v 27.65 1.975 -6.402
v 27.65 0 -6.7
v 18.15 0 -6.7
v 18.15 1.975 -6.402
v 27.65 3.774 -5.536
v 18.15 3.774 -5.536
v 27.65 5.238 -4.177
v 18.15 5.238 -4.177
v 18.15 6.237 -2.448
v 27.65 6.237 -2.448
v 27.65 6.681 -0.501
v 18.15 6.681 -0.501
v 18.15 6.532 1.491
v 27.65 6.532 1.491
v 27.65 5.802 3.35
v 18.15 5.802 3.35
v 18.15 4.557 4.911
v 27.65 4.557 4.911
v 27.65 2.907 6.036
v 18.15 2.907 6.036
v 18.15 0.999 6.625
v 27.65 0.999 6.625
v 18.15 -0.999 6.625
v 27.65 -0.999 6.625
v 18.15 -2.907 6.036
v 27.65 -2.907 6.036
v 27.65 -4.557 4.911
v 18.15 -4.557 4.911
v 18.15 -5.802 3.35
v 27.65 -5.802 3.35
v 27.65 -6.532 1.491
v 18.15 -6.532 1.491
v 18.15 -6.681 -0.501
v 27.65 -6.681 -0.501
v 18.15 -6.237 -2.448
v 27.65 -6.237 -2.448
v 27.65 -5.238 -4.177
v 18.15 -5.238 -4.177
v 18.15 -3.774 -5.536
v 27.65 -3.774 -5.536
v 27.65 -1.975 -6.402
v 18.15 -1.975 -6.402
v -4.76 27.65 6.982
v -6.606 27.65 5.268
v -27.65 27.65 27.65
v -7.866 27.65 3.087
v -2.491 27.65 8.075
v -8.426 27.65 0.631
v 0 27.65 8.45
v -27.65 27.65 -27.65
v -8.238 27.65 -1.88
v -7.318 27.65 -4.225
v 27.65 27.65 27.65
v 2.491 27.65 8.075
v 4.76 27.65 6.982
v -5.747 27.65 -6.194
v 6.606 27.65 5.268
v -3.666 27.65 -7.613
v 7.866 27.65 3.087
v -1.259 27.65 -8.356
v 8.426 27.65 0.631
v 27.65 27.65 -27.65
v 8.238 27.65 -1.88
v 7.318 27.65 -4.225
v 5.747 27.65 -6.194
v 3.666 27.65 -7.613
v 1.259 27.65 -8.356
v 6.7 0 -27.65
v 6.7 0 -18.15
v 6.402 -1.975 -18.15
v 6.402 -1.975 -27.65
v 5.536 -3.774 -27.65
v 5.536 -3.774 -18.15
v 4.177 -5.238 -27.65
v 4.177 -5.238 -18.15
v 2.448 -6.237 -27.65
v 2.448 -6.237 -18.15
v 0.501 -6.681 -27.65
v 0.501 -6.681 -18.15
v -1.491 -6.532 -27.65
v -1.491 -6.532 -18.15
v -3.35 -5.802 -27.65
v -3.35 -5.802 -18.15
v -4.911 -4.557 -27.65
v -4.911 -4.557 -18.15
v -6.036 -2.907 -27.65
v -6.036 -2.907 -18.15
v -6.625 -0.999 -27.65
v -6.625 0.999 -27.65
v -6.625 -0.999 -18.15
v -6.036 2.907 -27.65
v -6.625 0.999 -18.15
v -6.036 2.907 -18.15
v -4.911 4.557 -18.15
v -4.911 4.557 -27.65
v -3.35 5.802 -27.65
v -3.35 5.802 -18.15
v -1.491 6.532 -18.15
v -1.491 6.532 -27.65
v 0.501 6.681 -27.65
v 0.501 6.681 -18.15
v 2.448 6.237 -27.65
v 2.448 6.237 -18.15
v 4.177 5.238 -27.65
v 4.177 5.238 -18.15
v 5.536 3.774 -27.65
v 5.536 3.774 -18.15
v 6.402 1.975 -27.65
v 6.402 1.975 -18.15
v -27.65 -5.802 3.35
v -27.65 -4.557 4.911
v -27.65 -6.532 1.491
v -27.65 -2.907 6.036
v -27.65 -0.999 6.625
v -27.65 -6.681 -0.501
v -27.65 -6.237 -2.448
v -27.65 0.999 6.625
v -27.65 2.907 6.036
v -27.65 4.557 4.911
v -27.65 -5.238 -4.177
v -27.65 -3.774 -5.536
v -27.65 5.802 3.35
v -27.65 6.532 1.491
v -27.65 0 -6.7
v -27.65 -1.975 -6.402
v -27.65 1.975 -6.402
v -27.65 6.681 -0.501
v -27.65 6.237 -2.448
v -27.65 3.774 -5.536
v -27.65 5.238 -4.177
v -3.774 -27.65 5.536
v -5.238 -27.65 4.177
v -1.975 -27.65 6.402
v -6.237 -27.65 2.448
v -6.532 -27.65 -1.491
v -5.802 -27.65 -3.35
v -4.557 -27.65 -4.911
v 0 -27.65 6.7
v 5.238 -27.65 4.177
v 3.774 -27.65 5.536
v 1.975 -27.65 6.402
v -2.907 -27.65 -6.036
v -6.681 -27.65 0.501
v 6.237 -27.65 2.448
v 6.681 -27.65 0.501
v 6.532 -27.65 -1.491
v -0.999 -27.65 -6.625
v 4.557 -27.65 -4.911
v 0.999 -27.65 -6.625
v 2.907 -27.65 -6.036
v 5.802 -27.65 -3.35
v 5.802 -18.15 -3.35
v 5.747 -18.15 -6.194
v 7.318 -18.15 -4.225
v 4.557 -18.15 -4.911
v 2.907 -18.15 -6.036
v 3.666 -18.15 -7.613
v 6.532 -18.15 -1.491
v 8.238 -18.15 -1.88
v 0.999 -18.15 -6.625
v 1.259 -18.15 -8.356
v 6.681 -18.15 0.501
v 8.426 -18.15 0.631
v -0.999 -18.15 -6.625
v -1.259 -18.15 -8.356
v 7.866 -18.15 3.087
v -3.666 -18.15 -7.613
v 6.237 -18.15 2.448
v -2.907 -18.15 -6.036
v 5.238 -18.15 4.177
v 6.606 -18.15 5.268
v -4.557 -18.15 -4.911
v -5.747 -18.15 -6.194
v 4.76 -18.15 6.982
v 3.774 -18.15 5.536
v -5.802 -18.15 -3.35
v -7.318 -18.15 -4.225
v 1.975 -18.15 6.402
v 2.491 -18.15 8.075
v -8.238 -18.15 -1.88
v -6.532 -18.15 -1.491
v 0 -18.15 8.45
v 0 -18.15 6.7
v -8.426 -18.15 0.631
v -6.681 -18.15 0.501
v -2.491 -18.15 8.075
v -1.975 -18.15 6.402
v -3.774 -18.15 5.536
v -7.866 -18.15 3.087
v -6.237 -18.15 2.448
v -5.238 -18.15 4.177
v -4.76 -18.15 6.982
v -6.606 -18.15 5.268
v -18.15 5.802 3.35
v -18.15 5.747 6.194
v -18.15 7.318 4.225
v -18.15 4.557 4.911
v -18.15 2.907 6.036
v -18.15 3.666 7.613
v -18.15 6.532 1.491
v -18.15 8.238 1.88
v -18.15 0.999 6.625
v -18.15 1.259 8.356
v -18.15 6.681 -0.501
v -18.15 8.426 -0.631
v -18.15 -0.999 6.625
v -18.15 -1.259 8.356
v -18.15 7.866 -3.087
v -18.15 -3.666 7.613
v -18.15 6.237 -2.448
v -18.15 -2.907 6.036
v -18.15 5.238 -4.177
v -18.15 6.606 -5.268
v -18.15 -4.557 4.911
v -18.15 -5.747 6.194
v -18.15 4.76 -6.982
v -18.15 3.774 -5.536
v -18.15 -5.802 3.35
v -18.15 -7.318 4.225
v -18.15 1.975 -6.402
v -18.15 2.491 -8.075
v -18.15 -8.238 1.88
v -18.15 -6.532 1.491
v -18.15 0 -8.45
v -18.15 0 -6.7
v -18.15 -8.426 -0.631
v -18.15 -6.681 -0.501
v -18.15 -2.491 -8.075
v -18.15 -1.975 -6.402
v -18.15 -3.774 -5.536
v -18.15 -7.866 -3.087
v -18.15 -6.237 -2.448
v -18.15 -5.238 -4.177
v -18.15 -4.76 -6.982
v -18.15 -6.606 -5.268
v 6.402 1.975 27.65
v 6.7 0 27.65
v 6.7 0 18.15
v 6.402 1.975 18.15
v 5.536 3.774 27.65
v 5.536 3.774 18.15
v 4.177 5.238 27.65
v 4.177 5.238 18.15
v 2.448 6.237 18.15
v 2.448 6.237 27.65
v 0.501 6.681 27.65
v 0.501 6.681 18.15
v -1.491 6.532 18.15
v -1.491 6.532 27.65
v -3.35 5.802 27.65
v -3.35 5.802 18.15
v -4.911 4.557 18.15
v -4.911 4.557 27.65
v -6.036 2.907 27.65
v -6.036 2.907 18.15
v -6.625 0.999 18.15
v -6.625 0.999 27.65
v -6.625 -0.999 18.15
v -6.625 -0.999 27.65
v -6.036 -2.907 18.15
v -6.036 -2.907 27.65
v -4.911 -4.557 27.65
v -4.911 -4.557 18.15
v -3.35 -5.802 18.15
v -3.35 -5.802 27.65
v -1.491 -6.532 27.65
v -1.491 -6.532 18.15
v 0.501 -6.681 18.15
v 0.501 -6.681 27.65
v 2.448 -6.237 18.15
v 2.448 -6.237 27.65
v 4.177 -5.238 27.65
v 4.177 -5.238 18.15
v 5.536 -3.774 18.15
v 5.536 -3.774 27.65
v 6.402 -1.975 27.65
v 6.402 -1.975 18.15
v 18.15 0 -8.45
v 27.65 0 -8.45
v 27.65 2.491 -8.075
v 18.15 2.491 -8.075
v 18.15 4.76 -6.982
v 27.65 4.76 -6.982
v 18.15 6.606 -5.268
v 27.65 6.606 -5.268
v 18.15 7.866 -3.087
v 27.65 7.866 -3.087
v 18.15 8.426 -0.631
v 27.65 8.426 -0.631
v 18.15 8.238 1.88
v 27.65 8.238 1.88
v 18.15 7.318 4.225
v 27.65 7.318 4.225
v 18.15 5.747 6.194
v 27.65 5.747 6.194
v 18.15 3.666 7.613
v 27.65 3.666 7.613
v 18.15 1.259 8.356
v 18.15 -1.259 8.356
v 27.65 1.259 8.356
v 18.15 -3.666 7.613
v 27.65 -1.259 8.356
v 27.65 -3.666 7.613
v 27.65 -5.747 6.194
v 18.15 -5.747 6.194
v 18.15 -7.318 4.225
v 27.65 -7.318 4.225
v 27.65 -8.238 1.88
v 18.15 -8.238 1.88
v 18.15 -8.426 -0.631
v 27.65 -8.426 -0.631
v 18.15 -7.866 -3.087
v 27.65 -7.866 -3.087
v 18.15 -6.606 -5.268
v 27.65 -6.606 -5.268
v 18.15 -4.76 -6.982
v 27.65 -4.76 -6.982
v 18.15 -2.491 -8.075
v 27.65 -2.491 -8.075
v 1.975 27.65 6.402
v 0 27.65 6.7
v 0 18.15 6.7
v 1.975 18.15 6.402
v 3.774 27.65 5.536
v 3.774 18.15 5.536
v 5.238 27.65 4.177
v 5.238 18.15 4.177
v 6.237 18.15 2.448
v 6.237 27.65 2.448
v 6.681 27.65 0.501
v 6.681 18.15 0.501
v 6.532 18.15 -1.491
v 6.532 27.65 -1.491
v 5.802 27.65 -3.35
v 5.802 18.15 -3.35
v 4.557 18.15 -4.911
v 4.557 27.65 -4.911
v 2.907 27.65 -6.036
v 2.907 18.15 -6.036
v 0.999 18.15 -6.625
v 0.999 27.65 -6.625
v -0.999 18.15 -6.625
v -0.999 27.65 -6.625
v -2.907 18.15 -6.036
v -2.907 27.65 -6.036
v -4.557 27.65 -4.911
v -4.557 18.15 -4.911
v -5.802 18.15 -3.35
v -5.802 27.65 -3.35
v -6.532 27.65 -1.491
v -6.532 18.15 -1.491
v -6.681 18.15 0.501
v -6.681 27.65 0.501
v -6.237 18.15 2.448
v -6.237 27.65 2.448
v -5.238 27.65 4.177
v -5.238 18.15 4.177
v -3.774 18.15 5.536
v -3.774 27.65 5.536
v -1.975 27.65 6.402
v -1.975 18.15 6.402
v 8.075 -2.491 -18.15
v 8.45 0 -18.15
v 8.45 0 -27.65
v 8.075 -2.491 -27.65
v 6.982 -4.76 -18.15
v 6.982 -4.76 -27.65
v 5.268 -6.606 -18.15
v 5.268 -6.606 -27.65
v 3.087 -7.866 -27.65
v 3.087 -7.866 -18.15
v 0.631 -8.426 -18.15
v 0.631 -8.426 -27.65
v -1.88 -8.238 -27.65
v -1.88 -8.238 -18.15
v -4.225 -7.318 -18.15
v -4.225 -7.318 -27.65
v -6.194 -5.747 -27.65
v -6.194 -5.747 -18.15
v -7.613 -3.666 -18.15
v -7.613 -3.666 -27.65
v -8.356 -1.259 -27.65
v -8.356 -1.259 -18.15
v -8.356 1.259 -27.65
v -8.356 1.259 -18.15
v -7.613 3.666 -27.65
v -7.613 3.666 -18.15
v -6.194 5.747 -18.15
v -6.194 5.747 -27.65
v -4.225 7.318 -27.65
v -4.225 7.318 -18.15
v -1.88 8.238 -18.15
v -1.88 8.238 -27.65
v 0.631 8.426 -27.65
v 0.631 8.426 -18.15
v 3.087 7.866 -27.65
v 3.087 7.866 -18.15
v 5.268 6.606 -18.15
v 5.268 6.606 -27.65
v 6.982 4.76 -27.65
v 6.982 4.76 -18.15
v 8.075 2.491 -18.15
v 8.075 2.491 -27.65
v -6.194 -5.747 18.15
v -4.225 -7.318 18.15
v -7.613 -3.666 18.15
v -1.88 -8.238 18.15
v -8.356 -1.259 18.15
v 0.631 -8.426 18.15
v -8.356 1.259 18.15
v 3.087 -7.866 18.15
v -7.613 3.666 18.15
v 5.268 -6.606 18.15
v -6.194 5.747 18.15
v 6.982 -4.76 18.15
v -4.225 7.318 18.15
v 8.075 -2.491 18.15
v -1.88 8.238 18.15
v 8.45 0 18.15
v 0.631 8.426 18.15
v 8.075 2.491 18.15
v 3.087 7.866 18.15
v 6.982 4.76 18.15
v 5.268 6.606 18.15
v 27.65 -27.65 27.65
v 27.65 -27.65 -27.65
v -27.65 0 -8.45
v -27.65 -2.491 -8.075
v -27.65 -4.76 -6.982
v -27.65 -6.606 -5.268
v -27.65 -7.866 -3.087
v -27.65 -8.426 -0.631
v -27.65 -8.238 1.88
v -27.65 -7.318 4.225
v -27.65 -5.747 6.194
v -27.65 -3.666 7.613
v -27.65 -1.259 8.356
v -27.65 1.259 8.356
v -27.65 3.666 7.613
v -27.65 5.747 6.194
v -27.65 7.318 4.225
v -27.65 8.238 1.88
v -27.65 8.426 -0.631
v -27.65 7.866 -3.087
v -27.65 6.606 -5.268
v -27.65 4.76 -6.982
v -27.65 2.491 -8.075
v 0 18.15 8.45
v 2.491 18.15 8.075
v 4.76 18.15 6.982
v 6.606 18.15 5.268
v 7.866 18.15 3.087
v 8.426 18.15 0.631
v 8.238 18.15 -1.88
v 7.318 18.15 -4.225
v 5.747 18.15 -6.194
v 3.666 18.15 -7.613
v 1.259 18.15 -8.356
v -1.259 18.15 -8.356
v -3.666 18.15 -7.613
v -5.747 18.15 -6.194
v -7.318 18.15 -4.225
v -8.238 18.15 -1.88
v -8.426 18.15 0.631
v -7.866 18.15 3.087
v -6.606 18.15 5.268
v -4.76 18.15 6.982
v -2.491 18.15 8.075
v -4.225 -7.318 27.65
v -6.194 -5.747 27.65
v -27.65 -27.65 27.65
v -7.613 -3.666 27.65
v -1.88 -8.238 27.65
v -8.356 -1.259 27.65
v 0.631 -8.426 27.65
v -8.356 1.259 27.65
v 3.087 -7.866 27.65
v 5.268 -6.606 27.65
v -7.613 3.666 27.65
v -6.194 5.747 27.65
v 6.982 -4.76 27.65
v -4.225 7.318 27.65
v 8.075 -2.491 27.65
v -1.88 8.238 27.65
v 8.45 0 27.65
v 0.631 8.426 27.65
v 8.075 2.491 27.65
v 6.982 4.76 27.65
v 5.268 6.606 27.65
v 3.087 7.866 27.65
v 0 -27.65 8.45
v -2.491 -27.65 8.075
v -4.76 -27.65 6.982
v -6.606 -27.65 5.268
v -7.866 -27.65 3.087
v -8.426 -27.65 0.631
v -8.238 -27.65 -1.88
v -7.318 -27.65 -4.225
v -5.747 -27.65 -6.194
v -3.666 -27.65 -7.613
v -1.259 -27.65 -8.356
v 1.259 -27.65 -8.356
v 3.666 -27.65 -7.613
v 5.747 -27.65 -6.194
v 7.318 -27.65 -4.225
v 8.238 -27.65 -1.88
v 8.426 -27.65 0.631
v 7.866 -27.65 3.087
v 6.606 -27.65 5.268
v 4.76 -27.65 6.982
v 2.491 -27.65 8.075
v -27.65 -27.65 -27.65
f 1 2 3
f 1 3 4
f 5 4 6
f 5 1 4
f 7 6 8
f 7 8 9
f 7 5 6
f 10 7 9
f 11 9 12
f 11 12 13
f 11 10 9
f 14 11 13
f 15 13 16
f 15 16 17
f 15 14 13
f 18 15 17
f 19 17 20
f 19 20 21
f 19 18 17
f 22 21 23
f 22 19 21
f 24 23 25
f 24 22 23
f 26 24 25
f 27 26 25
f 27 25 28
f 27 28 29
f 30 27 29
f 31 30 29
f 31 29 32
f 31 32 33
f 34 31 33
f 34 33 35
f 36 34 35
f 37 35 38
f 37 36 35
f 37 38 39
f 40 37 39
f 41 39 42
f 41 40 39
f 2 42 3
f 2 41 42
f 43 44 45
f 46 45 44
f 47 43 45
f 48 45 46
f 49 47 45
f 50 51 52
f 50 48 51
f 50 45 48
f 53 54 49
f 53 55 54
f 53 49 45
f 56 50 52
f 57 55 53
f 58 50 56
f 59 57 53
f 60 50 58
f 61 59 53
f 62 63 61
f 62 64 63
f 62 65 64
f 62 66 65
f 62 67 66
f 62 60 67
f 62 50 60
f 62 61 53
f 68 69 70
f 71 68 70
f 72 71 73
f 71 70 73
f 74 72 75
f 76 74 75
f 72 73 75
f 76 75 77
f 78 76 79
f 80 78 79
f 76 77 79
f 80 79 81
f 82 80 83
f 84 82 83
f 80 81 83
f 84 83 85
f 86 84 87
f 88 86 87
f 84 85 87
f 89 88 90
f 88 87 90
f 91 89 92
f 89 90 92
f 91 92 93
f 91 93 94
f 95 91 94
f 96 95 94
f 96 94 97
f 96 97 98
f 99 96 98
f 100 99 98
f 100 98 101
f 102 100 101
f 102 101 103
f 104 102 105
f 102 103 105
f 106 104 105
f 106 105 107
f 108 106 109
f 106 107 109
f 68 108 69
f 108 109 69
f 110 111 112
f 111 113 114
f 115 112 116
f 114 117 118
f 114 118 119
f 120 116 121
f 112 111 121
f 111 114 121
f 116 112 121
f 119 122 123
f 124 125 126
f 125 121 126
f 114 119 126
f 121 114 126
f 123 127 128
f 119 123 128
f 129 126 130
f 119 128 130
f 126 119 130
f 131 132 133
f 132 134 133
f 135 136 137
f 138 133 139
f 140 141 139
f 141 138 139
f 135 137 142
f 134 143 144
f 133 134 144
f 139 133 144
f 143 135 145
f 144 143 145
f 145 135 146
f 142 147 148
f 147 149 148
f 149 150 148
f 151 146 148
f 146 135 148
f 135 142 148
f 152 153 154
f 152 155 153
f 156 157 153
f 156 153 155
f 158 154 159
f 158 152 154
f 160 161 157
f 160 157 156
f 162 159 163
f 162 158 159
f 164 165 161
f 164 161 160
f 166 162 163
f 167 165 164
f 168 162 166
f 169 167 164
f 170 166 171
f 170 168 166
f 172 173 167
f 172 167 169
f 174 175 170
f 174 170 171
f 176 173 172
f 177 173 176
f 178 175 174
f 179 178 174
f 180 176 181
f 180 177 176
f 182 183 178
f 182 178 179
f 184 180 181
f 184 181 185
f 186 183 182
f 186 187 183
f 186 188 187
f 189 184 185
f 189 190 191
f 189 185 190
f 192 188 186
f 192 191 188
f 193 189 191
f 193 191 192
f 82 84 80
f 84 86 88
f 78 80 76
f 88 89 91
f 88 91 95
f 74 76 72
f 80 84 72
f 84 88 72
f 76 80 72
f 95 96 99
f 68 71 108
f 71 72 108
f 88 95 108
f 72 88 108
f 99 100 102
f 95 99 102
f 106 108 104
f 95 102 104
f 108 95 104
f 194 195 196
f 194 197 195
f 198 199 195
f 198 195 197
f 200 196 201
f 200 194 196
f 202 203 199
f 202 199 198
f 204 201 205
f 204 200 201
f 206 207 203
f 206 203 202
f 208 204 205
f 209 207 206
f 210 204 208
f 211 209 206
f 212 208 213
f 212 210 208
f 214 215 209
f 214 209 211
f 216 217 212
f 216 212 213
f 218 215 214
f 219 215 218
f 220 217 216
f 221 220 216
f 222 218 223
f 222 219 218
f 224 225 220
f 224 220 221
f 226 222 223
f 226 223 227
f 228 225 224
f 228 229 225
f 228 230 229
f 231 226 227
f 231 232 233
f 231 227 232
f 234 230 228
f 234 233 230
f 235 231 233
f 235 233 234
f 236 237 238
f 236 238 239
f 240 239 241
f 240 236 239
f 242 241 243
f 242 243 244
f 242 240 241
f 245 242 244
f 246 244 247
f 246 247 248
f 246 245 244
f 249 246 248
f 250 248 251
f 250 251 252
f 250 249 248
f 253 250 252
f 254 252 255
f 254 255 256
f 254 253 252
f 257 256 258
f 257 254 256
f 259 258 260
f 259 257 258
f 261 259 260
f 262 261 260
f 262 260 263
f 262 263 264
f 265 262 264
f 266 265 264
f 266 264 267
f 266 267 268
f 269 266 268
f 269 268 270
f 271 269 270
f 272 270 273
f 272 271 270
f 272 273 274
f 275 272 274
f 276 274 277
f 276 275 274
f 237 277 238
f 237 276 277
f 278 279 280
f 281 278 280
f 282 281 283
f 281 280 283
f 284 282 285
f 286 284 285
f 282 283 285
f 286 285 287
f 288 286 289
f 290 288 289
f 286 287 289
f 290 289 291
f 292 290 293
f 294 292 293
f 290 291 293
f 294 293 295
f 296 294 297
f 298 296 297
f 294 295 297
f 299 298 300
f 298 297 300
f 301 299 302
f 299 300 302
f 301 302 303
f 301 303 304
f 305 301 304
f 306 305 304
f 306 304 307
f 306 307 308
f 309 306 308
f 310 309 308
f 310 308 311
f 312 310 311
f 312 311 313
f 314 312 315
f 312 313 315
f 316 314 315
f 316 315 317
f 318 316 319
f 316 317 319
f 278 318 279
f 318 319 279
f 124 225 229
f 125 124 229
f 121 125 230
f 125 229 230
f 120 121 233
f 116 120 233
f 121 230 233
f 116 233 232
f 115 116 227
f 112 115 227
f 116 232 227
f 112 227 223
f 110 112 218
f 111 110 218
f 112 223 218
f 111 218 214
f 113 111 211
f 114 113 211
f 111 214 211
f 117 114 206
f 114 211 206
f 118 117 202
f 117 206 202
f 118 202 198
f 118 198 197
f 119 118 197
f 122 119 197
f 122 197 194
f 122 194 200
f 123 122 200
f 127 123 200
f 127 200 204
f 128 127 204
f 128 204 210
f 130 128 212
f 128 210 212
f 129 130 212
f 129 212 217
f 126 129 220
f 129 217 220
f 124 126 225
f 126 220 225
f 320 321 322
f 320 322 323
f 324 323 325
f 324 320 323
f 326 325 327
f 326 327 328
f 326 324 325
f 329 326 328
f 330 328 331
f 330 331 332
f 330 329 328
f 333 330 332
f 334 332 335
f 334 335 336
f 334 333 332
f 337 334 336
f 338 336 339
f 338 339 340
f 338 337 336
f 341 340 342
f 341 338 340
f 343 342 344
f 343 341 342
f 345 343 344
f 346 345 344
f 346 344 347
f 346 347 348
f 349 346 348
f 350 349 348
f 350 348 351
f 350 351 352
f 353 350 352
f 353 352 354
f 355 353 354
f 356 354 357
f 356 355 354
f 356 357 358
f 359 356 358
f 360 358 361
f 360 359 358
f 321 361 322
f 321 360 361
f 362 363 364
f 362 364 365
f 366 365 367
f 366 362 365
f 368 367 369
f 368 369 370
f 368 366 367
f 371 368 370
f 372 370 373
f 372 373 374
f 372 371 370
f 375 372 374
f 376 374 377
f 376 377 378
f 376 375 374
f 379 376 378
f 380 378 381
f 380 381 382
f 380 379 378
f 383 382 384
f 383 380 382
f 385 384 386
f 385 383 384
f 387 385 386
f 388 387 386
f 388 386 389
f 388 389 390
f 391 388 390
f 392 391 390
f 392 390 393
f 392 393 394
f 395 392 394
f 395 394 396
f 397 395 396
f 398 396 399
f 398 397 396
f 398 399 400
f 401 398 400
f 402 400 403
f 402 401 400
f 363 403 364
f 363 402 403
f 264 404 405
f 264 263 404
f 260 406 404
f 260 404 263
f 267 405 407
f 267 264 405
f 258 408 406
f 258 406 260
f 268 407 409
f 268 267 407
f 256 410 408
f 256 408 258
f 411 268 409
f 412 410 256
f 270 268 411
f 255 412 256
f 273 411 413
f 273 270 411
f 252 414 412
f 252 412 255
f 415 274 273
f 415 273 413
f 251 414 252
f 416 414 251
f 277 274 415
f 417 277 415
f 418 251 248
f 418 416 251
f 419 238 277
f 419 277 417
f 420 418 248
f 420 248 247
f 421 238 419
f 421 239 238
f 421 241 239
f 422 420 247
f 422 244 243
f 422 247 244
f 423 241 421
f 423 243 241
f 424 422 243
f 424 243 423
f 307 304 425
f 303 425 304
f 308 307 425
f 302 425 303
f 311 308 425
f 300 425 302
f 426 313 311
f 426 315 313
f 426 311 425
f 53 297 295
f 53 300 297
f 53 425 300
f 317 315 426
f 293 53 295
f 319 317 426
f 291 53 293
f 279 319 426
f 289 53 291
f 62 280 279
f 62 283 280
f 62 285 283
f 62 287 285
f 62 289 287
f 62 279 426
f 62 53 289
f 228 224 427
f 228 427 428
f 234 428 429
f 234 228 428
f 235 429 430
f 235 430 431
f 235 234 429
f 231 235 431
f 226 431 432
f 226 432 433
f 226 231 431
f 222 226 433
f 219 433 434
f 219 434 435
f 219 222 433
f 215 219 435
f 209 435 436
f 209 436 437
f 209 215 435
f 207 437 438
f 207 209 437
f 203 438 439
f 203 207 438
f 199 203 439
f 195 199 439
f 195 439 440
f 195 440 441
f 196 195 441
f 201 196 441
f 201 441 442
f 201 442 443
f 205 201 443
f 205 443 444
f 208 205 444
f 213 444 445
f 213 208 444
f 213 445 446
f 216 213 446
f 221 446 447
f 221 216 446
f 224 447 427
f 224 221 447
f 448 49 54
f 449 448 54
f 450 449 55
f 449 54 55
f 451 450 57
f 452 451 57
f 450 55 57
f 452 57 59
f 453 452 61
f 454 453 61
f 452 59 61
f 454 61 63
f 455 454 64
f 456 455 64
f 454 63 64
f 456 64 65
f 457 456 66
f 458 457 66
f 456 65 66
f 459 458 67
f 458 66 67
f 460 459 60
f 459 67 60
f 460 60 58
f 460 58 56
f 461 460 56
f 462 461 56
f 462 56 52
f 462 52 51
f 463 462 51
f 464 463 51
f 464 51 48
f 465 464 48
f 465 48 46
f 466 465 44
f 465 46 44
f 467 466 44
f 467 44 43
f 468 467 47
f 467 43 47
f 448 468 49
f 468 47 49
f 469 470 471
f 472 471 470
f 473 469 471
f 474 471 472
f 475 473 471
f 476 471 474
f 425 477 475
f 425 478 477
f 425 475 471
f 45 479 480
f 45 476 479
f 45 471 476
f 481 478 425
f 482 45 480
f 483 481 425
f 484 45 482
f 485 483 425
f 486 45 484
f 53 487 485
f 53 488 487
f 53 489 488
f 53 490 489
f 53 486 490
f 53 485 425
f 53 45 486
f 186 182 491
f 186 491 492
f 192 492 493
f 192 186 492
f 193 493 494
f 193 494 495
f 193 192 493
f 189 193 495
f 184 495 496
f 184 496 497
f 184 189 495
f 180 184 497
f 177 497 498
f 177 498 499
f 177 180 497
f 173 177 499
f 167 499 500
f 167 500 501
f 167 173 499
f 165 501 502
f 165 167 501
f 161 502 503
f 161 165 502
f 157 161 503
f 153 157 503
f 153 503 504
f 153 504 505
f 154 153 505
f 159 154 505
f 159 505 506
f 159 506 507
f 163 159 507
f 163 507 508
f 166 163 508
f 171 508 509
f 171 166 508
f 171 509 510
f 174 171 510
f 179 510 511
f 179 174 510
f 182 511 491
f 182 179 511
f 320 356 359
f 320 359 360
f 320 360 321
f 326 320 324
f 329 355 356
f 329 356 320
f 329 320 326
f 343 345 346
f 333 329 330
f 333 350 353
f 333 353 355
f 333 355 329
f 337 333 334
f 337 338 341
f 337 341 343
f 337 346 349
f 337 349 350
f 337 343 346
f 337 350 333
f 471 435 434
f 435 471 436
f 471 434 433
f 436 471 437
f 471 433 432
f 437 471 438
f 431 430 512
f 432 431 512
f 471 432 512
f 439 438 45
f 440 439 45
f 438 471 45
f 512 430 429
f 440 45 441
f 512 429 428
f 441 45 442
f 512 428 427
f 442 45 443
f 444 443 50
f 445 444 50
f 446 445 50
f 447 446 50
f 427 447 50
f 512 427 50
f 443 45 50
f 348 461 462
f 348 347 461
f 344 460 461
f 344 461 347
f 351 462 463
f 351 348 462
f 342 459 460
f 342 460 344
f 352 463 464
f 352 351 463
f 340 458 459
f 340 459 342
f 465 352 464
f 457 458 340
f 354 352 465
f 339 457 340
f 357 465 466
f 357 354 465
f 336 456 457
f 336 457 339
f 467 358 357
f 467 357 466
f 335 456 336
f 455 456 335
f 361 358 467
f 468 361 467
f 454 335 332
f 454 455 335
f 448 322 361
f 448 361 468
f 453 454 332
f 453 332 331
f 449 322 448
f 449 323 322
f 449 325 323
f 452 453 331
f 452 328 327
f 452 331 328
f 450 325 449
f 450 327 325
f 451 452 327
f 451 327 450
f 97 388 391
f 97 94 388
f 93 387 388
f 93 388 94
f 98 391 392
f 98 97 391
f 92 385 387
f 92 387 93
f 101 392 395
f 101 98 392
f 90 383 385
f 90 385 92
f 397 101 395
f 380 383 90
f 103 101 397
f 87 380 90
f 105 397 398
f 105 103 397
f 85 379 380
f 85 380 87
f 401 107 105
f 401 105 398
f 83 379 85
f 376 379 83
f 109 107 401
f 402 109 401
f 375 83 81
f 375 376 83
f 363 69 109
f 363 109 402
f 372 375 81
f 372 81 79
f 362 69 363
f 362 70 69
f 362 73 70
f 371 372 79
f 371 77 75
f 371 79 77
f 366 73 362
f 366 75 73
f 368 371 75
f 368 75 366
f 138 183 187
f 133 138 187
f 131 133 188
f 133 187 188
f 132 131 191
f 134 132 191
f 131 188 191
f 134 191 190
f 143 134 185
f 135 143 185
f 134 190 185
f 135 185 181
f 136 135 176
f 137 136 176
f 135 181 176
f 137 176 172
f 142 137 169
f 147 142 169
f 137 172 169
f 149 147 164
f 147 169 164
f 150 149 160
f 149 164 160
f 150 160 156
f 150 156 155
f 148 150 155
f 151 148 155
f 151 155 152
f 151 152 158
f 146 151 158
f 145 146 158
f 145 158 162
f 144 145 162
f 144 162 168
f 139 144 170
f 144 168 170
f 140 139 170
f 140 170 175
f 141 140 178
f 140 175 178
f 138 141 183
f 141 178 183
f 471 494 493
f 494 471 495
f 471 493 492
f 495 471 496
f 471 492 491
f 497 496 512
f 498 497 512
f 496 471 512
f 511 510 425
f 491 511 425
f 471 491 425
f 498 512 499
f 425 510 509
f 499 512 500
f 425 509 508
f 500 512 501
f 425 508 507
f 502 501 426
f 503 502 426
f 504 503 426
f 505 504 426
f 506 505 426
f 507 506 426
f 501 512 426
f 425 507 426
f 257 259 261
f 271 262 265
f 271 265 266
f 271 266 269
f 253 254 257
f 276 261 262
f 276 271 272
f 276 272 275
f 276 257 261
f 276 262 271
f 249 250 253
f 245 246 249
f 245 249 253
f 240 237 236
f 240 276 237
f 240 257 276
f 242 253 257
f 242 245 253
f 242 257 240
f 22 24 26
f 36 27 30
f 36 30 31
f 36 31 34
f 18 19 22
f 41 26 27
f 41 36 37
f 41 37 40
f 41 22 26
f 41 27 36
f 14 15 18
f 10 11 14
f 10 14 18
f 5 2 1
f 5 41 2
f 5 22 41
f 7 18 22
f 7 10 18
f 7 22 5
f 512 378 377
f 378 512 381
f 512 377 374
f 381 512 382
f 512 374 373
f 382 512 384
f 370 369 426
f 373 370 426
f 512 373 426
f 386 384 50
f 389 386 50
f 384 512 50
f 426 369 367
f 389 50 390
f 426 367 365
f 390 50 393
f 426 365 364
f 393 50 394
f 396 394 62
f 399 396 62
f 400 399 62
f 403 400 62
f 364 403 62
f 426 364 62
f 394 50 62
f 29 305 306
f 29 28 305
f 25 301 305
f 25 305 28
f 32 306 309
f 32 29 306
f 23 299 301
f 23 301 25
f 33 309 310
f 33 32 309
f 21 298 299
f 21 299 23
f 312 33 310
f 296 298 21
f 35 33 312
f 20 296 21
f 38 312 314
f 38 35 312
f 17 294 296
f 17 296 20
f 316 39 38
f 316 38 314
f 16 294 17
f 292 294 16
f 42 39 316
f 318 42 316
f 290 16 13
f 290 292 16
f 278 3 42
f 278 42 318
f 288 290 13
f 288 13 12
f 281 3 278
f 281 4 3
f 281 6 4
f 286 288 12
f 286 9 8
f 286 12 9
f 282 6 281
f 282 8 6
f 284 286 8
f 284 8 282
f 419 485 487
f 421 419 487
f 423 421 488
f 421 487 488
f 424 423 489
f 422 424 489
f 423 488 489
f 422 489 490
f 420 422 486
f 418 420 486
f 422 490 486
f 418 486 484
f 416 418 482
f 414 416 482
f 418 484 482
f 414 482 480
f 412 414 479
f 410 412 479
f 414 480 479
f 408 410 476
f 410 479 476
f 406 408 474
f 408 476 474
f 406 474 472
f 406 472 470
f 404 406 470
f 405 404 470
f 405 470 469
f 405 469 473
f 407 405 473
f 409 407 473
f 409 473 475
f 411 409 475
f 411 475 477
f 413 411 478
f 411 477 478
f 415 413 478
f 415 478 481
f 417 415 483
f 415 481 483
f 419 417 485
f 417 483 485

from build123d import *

# Parameters (mm, degrees)
SKETCH1_W           = 55.3
SKETCH1_H           = 55.3
BOSS_EXTRUDE1_DEPTH = 27.65
SKETCH2_R           = 8.45
SKETCH2_R_2         = 6.7
CUT_EXTRUDE2_DEPTH  = 9.5
CUT_EXTRUDE3_START  = -9.5
SKETCH3_R           = 8.45
SKETCH3_R_2         = 6.7
CUT_EXTRUDE3_DEPTH  = 9.5
SKETCH4_R           = 8.45
SKETCH4_R_2         = 6.7
CUT_EXTRUDE4_DEPTH  = 9.5
CUT_EXTRUDE5_START  = -9.5
SKETCH5_R           = 8.45
SKETCH5_R_2         = 6.7
CUT_EXTRUDE5_DEPTH  = 9.5
SKETCH6_R           = 8.45
SKETCH6_R_2         = 6.7
CUT_EXTRUDE6_DEPTH  = 9.5
CUT_EXTRUDE7_START  = -9.5
SKETCH7_R           = 8.45
SKETCH7_R_2         = 6.7
CUT_EXTRUDE7_DEPTH  = 9.5


with BuildPart() as part:
    # Sketch1 → Boss-Extrude1 (new, symmetric)
    with BuildSketch(Plane(origin=(0, 0, 0), x_dir=(1, 0, 0), z_dir=(0, 1, 0))):
        Rectangle(SKETCH1_W, SKETCH1_H)
    extrude(amount=BOSS_EXTRUDE1_DEPTH, both=True)

    # Sketch2 → Cut-Extrude2 (cut)
    with BuildSketch(Plane(origin=(0, 27.65, 0), x_dir=(1, 0, 0), z_dir=(0, 1, 0))):
        with Locations(Location((0, 0, 0), (0, 0, 270))):
            Circle(SKETCH2_R)
        with Locations(Location((0, 0, 0), (0, 0, 270))):
            Circle(SKETCH2_R_2, mode=Mode.SUBTRACT)
    extrude(amount=-CUT_EXTRUDE2_DEPTH, mode=Mode.SUBTRACT)

    # Sketch3 → Cut-Extrude3 (cut)
    with BuildSketch(Plane.XZ.offset(27.65).offset(CUT_EXTRUDE3_START)):
        with Locations(Location((0, 0, 0), (0, 0, 90))):
            Circle(SKETCH3_R)
        with Locations(Location((0, 0, 0), (0, 0, 90))):
            Circle(SKETCH3_R_2, mode=Mode.SUBTRACT)
    extrude(amount=CUT_EXTRUDE3_DEPTH, mode=Mode.SUBTRACT)

    # Sketch4 → Cut-Extrude4 (cut)
    with BuildSketch(Plane(origin=(27.65, 0, 0), x_dir=(0, 0, -1), z_dir=(1, 0, 0))):
        Circle(SKETCH4_R)
        Circle(SKETCH4_R_2, mode=Mode.SUBTRACT)
    extrude(amount=-CUT_EXTRUDE4_DEPTH, mode=Mode.SUBTRACT)

    # Sketch5 → Cut-Extrude5 (cut)
    with BuildSketch(Plane.ZY.offset(27.65).offset(CUT_EXTRUDE5_START)):
        with Locations(Location((0, 0, 0), (0, 0, 180))):
            Circle(SKETCH5_R)
        with Locations(Location((0, 0, 0), (0, 0, 180))):
            Circle(SKETCH5_R_2, mode=Mode.SUBTRACT)
    extrude(amount=CUT_EXTRUDE5_DEPTH, mode=Mode.SUBTRACT)

    # Sketch6 → Cut-Extrude6 (cut)
    with BuildSketch(Plane.XY.offset(27.65)):
        Circle(SKETCH6_R)
        Circle(SKETCH6_R_2, mode=Mode.SUBTRACT)
    extrude(amount=-CUT_EXTRUDE6_DEPTH, mode=Mode.SUBTRACT)

    # Sketch7 → Cut-Extrude7 (cut)
    with BuildSketch(Plane(origin=(0, 0, -27.65), x_dir=(-1, 0, 0), z_dir=(0, 0, -1)).offset(CUT_EXTRUDE7_START)):
        with Locations(Location((0, 0, 0), (0, 0, 180))):
            Circle(SKETCH7_R)
        with Locations(Location((0, 0, 0), (0, 0, 180))):
            Circle(SKETCH7_R_2, mode=Mode.SUBTRACT)
    extrude(amount=CUT_EXTRUDE7_DEPTH, mode=Mode.SUBTRACT)


solid = part.part
